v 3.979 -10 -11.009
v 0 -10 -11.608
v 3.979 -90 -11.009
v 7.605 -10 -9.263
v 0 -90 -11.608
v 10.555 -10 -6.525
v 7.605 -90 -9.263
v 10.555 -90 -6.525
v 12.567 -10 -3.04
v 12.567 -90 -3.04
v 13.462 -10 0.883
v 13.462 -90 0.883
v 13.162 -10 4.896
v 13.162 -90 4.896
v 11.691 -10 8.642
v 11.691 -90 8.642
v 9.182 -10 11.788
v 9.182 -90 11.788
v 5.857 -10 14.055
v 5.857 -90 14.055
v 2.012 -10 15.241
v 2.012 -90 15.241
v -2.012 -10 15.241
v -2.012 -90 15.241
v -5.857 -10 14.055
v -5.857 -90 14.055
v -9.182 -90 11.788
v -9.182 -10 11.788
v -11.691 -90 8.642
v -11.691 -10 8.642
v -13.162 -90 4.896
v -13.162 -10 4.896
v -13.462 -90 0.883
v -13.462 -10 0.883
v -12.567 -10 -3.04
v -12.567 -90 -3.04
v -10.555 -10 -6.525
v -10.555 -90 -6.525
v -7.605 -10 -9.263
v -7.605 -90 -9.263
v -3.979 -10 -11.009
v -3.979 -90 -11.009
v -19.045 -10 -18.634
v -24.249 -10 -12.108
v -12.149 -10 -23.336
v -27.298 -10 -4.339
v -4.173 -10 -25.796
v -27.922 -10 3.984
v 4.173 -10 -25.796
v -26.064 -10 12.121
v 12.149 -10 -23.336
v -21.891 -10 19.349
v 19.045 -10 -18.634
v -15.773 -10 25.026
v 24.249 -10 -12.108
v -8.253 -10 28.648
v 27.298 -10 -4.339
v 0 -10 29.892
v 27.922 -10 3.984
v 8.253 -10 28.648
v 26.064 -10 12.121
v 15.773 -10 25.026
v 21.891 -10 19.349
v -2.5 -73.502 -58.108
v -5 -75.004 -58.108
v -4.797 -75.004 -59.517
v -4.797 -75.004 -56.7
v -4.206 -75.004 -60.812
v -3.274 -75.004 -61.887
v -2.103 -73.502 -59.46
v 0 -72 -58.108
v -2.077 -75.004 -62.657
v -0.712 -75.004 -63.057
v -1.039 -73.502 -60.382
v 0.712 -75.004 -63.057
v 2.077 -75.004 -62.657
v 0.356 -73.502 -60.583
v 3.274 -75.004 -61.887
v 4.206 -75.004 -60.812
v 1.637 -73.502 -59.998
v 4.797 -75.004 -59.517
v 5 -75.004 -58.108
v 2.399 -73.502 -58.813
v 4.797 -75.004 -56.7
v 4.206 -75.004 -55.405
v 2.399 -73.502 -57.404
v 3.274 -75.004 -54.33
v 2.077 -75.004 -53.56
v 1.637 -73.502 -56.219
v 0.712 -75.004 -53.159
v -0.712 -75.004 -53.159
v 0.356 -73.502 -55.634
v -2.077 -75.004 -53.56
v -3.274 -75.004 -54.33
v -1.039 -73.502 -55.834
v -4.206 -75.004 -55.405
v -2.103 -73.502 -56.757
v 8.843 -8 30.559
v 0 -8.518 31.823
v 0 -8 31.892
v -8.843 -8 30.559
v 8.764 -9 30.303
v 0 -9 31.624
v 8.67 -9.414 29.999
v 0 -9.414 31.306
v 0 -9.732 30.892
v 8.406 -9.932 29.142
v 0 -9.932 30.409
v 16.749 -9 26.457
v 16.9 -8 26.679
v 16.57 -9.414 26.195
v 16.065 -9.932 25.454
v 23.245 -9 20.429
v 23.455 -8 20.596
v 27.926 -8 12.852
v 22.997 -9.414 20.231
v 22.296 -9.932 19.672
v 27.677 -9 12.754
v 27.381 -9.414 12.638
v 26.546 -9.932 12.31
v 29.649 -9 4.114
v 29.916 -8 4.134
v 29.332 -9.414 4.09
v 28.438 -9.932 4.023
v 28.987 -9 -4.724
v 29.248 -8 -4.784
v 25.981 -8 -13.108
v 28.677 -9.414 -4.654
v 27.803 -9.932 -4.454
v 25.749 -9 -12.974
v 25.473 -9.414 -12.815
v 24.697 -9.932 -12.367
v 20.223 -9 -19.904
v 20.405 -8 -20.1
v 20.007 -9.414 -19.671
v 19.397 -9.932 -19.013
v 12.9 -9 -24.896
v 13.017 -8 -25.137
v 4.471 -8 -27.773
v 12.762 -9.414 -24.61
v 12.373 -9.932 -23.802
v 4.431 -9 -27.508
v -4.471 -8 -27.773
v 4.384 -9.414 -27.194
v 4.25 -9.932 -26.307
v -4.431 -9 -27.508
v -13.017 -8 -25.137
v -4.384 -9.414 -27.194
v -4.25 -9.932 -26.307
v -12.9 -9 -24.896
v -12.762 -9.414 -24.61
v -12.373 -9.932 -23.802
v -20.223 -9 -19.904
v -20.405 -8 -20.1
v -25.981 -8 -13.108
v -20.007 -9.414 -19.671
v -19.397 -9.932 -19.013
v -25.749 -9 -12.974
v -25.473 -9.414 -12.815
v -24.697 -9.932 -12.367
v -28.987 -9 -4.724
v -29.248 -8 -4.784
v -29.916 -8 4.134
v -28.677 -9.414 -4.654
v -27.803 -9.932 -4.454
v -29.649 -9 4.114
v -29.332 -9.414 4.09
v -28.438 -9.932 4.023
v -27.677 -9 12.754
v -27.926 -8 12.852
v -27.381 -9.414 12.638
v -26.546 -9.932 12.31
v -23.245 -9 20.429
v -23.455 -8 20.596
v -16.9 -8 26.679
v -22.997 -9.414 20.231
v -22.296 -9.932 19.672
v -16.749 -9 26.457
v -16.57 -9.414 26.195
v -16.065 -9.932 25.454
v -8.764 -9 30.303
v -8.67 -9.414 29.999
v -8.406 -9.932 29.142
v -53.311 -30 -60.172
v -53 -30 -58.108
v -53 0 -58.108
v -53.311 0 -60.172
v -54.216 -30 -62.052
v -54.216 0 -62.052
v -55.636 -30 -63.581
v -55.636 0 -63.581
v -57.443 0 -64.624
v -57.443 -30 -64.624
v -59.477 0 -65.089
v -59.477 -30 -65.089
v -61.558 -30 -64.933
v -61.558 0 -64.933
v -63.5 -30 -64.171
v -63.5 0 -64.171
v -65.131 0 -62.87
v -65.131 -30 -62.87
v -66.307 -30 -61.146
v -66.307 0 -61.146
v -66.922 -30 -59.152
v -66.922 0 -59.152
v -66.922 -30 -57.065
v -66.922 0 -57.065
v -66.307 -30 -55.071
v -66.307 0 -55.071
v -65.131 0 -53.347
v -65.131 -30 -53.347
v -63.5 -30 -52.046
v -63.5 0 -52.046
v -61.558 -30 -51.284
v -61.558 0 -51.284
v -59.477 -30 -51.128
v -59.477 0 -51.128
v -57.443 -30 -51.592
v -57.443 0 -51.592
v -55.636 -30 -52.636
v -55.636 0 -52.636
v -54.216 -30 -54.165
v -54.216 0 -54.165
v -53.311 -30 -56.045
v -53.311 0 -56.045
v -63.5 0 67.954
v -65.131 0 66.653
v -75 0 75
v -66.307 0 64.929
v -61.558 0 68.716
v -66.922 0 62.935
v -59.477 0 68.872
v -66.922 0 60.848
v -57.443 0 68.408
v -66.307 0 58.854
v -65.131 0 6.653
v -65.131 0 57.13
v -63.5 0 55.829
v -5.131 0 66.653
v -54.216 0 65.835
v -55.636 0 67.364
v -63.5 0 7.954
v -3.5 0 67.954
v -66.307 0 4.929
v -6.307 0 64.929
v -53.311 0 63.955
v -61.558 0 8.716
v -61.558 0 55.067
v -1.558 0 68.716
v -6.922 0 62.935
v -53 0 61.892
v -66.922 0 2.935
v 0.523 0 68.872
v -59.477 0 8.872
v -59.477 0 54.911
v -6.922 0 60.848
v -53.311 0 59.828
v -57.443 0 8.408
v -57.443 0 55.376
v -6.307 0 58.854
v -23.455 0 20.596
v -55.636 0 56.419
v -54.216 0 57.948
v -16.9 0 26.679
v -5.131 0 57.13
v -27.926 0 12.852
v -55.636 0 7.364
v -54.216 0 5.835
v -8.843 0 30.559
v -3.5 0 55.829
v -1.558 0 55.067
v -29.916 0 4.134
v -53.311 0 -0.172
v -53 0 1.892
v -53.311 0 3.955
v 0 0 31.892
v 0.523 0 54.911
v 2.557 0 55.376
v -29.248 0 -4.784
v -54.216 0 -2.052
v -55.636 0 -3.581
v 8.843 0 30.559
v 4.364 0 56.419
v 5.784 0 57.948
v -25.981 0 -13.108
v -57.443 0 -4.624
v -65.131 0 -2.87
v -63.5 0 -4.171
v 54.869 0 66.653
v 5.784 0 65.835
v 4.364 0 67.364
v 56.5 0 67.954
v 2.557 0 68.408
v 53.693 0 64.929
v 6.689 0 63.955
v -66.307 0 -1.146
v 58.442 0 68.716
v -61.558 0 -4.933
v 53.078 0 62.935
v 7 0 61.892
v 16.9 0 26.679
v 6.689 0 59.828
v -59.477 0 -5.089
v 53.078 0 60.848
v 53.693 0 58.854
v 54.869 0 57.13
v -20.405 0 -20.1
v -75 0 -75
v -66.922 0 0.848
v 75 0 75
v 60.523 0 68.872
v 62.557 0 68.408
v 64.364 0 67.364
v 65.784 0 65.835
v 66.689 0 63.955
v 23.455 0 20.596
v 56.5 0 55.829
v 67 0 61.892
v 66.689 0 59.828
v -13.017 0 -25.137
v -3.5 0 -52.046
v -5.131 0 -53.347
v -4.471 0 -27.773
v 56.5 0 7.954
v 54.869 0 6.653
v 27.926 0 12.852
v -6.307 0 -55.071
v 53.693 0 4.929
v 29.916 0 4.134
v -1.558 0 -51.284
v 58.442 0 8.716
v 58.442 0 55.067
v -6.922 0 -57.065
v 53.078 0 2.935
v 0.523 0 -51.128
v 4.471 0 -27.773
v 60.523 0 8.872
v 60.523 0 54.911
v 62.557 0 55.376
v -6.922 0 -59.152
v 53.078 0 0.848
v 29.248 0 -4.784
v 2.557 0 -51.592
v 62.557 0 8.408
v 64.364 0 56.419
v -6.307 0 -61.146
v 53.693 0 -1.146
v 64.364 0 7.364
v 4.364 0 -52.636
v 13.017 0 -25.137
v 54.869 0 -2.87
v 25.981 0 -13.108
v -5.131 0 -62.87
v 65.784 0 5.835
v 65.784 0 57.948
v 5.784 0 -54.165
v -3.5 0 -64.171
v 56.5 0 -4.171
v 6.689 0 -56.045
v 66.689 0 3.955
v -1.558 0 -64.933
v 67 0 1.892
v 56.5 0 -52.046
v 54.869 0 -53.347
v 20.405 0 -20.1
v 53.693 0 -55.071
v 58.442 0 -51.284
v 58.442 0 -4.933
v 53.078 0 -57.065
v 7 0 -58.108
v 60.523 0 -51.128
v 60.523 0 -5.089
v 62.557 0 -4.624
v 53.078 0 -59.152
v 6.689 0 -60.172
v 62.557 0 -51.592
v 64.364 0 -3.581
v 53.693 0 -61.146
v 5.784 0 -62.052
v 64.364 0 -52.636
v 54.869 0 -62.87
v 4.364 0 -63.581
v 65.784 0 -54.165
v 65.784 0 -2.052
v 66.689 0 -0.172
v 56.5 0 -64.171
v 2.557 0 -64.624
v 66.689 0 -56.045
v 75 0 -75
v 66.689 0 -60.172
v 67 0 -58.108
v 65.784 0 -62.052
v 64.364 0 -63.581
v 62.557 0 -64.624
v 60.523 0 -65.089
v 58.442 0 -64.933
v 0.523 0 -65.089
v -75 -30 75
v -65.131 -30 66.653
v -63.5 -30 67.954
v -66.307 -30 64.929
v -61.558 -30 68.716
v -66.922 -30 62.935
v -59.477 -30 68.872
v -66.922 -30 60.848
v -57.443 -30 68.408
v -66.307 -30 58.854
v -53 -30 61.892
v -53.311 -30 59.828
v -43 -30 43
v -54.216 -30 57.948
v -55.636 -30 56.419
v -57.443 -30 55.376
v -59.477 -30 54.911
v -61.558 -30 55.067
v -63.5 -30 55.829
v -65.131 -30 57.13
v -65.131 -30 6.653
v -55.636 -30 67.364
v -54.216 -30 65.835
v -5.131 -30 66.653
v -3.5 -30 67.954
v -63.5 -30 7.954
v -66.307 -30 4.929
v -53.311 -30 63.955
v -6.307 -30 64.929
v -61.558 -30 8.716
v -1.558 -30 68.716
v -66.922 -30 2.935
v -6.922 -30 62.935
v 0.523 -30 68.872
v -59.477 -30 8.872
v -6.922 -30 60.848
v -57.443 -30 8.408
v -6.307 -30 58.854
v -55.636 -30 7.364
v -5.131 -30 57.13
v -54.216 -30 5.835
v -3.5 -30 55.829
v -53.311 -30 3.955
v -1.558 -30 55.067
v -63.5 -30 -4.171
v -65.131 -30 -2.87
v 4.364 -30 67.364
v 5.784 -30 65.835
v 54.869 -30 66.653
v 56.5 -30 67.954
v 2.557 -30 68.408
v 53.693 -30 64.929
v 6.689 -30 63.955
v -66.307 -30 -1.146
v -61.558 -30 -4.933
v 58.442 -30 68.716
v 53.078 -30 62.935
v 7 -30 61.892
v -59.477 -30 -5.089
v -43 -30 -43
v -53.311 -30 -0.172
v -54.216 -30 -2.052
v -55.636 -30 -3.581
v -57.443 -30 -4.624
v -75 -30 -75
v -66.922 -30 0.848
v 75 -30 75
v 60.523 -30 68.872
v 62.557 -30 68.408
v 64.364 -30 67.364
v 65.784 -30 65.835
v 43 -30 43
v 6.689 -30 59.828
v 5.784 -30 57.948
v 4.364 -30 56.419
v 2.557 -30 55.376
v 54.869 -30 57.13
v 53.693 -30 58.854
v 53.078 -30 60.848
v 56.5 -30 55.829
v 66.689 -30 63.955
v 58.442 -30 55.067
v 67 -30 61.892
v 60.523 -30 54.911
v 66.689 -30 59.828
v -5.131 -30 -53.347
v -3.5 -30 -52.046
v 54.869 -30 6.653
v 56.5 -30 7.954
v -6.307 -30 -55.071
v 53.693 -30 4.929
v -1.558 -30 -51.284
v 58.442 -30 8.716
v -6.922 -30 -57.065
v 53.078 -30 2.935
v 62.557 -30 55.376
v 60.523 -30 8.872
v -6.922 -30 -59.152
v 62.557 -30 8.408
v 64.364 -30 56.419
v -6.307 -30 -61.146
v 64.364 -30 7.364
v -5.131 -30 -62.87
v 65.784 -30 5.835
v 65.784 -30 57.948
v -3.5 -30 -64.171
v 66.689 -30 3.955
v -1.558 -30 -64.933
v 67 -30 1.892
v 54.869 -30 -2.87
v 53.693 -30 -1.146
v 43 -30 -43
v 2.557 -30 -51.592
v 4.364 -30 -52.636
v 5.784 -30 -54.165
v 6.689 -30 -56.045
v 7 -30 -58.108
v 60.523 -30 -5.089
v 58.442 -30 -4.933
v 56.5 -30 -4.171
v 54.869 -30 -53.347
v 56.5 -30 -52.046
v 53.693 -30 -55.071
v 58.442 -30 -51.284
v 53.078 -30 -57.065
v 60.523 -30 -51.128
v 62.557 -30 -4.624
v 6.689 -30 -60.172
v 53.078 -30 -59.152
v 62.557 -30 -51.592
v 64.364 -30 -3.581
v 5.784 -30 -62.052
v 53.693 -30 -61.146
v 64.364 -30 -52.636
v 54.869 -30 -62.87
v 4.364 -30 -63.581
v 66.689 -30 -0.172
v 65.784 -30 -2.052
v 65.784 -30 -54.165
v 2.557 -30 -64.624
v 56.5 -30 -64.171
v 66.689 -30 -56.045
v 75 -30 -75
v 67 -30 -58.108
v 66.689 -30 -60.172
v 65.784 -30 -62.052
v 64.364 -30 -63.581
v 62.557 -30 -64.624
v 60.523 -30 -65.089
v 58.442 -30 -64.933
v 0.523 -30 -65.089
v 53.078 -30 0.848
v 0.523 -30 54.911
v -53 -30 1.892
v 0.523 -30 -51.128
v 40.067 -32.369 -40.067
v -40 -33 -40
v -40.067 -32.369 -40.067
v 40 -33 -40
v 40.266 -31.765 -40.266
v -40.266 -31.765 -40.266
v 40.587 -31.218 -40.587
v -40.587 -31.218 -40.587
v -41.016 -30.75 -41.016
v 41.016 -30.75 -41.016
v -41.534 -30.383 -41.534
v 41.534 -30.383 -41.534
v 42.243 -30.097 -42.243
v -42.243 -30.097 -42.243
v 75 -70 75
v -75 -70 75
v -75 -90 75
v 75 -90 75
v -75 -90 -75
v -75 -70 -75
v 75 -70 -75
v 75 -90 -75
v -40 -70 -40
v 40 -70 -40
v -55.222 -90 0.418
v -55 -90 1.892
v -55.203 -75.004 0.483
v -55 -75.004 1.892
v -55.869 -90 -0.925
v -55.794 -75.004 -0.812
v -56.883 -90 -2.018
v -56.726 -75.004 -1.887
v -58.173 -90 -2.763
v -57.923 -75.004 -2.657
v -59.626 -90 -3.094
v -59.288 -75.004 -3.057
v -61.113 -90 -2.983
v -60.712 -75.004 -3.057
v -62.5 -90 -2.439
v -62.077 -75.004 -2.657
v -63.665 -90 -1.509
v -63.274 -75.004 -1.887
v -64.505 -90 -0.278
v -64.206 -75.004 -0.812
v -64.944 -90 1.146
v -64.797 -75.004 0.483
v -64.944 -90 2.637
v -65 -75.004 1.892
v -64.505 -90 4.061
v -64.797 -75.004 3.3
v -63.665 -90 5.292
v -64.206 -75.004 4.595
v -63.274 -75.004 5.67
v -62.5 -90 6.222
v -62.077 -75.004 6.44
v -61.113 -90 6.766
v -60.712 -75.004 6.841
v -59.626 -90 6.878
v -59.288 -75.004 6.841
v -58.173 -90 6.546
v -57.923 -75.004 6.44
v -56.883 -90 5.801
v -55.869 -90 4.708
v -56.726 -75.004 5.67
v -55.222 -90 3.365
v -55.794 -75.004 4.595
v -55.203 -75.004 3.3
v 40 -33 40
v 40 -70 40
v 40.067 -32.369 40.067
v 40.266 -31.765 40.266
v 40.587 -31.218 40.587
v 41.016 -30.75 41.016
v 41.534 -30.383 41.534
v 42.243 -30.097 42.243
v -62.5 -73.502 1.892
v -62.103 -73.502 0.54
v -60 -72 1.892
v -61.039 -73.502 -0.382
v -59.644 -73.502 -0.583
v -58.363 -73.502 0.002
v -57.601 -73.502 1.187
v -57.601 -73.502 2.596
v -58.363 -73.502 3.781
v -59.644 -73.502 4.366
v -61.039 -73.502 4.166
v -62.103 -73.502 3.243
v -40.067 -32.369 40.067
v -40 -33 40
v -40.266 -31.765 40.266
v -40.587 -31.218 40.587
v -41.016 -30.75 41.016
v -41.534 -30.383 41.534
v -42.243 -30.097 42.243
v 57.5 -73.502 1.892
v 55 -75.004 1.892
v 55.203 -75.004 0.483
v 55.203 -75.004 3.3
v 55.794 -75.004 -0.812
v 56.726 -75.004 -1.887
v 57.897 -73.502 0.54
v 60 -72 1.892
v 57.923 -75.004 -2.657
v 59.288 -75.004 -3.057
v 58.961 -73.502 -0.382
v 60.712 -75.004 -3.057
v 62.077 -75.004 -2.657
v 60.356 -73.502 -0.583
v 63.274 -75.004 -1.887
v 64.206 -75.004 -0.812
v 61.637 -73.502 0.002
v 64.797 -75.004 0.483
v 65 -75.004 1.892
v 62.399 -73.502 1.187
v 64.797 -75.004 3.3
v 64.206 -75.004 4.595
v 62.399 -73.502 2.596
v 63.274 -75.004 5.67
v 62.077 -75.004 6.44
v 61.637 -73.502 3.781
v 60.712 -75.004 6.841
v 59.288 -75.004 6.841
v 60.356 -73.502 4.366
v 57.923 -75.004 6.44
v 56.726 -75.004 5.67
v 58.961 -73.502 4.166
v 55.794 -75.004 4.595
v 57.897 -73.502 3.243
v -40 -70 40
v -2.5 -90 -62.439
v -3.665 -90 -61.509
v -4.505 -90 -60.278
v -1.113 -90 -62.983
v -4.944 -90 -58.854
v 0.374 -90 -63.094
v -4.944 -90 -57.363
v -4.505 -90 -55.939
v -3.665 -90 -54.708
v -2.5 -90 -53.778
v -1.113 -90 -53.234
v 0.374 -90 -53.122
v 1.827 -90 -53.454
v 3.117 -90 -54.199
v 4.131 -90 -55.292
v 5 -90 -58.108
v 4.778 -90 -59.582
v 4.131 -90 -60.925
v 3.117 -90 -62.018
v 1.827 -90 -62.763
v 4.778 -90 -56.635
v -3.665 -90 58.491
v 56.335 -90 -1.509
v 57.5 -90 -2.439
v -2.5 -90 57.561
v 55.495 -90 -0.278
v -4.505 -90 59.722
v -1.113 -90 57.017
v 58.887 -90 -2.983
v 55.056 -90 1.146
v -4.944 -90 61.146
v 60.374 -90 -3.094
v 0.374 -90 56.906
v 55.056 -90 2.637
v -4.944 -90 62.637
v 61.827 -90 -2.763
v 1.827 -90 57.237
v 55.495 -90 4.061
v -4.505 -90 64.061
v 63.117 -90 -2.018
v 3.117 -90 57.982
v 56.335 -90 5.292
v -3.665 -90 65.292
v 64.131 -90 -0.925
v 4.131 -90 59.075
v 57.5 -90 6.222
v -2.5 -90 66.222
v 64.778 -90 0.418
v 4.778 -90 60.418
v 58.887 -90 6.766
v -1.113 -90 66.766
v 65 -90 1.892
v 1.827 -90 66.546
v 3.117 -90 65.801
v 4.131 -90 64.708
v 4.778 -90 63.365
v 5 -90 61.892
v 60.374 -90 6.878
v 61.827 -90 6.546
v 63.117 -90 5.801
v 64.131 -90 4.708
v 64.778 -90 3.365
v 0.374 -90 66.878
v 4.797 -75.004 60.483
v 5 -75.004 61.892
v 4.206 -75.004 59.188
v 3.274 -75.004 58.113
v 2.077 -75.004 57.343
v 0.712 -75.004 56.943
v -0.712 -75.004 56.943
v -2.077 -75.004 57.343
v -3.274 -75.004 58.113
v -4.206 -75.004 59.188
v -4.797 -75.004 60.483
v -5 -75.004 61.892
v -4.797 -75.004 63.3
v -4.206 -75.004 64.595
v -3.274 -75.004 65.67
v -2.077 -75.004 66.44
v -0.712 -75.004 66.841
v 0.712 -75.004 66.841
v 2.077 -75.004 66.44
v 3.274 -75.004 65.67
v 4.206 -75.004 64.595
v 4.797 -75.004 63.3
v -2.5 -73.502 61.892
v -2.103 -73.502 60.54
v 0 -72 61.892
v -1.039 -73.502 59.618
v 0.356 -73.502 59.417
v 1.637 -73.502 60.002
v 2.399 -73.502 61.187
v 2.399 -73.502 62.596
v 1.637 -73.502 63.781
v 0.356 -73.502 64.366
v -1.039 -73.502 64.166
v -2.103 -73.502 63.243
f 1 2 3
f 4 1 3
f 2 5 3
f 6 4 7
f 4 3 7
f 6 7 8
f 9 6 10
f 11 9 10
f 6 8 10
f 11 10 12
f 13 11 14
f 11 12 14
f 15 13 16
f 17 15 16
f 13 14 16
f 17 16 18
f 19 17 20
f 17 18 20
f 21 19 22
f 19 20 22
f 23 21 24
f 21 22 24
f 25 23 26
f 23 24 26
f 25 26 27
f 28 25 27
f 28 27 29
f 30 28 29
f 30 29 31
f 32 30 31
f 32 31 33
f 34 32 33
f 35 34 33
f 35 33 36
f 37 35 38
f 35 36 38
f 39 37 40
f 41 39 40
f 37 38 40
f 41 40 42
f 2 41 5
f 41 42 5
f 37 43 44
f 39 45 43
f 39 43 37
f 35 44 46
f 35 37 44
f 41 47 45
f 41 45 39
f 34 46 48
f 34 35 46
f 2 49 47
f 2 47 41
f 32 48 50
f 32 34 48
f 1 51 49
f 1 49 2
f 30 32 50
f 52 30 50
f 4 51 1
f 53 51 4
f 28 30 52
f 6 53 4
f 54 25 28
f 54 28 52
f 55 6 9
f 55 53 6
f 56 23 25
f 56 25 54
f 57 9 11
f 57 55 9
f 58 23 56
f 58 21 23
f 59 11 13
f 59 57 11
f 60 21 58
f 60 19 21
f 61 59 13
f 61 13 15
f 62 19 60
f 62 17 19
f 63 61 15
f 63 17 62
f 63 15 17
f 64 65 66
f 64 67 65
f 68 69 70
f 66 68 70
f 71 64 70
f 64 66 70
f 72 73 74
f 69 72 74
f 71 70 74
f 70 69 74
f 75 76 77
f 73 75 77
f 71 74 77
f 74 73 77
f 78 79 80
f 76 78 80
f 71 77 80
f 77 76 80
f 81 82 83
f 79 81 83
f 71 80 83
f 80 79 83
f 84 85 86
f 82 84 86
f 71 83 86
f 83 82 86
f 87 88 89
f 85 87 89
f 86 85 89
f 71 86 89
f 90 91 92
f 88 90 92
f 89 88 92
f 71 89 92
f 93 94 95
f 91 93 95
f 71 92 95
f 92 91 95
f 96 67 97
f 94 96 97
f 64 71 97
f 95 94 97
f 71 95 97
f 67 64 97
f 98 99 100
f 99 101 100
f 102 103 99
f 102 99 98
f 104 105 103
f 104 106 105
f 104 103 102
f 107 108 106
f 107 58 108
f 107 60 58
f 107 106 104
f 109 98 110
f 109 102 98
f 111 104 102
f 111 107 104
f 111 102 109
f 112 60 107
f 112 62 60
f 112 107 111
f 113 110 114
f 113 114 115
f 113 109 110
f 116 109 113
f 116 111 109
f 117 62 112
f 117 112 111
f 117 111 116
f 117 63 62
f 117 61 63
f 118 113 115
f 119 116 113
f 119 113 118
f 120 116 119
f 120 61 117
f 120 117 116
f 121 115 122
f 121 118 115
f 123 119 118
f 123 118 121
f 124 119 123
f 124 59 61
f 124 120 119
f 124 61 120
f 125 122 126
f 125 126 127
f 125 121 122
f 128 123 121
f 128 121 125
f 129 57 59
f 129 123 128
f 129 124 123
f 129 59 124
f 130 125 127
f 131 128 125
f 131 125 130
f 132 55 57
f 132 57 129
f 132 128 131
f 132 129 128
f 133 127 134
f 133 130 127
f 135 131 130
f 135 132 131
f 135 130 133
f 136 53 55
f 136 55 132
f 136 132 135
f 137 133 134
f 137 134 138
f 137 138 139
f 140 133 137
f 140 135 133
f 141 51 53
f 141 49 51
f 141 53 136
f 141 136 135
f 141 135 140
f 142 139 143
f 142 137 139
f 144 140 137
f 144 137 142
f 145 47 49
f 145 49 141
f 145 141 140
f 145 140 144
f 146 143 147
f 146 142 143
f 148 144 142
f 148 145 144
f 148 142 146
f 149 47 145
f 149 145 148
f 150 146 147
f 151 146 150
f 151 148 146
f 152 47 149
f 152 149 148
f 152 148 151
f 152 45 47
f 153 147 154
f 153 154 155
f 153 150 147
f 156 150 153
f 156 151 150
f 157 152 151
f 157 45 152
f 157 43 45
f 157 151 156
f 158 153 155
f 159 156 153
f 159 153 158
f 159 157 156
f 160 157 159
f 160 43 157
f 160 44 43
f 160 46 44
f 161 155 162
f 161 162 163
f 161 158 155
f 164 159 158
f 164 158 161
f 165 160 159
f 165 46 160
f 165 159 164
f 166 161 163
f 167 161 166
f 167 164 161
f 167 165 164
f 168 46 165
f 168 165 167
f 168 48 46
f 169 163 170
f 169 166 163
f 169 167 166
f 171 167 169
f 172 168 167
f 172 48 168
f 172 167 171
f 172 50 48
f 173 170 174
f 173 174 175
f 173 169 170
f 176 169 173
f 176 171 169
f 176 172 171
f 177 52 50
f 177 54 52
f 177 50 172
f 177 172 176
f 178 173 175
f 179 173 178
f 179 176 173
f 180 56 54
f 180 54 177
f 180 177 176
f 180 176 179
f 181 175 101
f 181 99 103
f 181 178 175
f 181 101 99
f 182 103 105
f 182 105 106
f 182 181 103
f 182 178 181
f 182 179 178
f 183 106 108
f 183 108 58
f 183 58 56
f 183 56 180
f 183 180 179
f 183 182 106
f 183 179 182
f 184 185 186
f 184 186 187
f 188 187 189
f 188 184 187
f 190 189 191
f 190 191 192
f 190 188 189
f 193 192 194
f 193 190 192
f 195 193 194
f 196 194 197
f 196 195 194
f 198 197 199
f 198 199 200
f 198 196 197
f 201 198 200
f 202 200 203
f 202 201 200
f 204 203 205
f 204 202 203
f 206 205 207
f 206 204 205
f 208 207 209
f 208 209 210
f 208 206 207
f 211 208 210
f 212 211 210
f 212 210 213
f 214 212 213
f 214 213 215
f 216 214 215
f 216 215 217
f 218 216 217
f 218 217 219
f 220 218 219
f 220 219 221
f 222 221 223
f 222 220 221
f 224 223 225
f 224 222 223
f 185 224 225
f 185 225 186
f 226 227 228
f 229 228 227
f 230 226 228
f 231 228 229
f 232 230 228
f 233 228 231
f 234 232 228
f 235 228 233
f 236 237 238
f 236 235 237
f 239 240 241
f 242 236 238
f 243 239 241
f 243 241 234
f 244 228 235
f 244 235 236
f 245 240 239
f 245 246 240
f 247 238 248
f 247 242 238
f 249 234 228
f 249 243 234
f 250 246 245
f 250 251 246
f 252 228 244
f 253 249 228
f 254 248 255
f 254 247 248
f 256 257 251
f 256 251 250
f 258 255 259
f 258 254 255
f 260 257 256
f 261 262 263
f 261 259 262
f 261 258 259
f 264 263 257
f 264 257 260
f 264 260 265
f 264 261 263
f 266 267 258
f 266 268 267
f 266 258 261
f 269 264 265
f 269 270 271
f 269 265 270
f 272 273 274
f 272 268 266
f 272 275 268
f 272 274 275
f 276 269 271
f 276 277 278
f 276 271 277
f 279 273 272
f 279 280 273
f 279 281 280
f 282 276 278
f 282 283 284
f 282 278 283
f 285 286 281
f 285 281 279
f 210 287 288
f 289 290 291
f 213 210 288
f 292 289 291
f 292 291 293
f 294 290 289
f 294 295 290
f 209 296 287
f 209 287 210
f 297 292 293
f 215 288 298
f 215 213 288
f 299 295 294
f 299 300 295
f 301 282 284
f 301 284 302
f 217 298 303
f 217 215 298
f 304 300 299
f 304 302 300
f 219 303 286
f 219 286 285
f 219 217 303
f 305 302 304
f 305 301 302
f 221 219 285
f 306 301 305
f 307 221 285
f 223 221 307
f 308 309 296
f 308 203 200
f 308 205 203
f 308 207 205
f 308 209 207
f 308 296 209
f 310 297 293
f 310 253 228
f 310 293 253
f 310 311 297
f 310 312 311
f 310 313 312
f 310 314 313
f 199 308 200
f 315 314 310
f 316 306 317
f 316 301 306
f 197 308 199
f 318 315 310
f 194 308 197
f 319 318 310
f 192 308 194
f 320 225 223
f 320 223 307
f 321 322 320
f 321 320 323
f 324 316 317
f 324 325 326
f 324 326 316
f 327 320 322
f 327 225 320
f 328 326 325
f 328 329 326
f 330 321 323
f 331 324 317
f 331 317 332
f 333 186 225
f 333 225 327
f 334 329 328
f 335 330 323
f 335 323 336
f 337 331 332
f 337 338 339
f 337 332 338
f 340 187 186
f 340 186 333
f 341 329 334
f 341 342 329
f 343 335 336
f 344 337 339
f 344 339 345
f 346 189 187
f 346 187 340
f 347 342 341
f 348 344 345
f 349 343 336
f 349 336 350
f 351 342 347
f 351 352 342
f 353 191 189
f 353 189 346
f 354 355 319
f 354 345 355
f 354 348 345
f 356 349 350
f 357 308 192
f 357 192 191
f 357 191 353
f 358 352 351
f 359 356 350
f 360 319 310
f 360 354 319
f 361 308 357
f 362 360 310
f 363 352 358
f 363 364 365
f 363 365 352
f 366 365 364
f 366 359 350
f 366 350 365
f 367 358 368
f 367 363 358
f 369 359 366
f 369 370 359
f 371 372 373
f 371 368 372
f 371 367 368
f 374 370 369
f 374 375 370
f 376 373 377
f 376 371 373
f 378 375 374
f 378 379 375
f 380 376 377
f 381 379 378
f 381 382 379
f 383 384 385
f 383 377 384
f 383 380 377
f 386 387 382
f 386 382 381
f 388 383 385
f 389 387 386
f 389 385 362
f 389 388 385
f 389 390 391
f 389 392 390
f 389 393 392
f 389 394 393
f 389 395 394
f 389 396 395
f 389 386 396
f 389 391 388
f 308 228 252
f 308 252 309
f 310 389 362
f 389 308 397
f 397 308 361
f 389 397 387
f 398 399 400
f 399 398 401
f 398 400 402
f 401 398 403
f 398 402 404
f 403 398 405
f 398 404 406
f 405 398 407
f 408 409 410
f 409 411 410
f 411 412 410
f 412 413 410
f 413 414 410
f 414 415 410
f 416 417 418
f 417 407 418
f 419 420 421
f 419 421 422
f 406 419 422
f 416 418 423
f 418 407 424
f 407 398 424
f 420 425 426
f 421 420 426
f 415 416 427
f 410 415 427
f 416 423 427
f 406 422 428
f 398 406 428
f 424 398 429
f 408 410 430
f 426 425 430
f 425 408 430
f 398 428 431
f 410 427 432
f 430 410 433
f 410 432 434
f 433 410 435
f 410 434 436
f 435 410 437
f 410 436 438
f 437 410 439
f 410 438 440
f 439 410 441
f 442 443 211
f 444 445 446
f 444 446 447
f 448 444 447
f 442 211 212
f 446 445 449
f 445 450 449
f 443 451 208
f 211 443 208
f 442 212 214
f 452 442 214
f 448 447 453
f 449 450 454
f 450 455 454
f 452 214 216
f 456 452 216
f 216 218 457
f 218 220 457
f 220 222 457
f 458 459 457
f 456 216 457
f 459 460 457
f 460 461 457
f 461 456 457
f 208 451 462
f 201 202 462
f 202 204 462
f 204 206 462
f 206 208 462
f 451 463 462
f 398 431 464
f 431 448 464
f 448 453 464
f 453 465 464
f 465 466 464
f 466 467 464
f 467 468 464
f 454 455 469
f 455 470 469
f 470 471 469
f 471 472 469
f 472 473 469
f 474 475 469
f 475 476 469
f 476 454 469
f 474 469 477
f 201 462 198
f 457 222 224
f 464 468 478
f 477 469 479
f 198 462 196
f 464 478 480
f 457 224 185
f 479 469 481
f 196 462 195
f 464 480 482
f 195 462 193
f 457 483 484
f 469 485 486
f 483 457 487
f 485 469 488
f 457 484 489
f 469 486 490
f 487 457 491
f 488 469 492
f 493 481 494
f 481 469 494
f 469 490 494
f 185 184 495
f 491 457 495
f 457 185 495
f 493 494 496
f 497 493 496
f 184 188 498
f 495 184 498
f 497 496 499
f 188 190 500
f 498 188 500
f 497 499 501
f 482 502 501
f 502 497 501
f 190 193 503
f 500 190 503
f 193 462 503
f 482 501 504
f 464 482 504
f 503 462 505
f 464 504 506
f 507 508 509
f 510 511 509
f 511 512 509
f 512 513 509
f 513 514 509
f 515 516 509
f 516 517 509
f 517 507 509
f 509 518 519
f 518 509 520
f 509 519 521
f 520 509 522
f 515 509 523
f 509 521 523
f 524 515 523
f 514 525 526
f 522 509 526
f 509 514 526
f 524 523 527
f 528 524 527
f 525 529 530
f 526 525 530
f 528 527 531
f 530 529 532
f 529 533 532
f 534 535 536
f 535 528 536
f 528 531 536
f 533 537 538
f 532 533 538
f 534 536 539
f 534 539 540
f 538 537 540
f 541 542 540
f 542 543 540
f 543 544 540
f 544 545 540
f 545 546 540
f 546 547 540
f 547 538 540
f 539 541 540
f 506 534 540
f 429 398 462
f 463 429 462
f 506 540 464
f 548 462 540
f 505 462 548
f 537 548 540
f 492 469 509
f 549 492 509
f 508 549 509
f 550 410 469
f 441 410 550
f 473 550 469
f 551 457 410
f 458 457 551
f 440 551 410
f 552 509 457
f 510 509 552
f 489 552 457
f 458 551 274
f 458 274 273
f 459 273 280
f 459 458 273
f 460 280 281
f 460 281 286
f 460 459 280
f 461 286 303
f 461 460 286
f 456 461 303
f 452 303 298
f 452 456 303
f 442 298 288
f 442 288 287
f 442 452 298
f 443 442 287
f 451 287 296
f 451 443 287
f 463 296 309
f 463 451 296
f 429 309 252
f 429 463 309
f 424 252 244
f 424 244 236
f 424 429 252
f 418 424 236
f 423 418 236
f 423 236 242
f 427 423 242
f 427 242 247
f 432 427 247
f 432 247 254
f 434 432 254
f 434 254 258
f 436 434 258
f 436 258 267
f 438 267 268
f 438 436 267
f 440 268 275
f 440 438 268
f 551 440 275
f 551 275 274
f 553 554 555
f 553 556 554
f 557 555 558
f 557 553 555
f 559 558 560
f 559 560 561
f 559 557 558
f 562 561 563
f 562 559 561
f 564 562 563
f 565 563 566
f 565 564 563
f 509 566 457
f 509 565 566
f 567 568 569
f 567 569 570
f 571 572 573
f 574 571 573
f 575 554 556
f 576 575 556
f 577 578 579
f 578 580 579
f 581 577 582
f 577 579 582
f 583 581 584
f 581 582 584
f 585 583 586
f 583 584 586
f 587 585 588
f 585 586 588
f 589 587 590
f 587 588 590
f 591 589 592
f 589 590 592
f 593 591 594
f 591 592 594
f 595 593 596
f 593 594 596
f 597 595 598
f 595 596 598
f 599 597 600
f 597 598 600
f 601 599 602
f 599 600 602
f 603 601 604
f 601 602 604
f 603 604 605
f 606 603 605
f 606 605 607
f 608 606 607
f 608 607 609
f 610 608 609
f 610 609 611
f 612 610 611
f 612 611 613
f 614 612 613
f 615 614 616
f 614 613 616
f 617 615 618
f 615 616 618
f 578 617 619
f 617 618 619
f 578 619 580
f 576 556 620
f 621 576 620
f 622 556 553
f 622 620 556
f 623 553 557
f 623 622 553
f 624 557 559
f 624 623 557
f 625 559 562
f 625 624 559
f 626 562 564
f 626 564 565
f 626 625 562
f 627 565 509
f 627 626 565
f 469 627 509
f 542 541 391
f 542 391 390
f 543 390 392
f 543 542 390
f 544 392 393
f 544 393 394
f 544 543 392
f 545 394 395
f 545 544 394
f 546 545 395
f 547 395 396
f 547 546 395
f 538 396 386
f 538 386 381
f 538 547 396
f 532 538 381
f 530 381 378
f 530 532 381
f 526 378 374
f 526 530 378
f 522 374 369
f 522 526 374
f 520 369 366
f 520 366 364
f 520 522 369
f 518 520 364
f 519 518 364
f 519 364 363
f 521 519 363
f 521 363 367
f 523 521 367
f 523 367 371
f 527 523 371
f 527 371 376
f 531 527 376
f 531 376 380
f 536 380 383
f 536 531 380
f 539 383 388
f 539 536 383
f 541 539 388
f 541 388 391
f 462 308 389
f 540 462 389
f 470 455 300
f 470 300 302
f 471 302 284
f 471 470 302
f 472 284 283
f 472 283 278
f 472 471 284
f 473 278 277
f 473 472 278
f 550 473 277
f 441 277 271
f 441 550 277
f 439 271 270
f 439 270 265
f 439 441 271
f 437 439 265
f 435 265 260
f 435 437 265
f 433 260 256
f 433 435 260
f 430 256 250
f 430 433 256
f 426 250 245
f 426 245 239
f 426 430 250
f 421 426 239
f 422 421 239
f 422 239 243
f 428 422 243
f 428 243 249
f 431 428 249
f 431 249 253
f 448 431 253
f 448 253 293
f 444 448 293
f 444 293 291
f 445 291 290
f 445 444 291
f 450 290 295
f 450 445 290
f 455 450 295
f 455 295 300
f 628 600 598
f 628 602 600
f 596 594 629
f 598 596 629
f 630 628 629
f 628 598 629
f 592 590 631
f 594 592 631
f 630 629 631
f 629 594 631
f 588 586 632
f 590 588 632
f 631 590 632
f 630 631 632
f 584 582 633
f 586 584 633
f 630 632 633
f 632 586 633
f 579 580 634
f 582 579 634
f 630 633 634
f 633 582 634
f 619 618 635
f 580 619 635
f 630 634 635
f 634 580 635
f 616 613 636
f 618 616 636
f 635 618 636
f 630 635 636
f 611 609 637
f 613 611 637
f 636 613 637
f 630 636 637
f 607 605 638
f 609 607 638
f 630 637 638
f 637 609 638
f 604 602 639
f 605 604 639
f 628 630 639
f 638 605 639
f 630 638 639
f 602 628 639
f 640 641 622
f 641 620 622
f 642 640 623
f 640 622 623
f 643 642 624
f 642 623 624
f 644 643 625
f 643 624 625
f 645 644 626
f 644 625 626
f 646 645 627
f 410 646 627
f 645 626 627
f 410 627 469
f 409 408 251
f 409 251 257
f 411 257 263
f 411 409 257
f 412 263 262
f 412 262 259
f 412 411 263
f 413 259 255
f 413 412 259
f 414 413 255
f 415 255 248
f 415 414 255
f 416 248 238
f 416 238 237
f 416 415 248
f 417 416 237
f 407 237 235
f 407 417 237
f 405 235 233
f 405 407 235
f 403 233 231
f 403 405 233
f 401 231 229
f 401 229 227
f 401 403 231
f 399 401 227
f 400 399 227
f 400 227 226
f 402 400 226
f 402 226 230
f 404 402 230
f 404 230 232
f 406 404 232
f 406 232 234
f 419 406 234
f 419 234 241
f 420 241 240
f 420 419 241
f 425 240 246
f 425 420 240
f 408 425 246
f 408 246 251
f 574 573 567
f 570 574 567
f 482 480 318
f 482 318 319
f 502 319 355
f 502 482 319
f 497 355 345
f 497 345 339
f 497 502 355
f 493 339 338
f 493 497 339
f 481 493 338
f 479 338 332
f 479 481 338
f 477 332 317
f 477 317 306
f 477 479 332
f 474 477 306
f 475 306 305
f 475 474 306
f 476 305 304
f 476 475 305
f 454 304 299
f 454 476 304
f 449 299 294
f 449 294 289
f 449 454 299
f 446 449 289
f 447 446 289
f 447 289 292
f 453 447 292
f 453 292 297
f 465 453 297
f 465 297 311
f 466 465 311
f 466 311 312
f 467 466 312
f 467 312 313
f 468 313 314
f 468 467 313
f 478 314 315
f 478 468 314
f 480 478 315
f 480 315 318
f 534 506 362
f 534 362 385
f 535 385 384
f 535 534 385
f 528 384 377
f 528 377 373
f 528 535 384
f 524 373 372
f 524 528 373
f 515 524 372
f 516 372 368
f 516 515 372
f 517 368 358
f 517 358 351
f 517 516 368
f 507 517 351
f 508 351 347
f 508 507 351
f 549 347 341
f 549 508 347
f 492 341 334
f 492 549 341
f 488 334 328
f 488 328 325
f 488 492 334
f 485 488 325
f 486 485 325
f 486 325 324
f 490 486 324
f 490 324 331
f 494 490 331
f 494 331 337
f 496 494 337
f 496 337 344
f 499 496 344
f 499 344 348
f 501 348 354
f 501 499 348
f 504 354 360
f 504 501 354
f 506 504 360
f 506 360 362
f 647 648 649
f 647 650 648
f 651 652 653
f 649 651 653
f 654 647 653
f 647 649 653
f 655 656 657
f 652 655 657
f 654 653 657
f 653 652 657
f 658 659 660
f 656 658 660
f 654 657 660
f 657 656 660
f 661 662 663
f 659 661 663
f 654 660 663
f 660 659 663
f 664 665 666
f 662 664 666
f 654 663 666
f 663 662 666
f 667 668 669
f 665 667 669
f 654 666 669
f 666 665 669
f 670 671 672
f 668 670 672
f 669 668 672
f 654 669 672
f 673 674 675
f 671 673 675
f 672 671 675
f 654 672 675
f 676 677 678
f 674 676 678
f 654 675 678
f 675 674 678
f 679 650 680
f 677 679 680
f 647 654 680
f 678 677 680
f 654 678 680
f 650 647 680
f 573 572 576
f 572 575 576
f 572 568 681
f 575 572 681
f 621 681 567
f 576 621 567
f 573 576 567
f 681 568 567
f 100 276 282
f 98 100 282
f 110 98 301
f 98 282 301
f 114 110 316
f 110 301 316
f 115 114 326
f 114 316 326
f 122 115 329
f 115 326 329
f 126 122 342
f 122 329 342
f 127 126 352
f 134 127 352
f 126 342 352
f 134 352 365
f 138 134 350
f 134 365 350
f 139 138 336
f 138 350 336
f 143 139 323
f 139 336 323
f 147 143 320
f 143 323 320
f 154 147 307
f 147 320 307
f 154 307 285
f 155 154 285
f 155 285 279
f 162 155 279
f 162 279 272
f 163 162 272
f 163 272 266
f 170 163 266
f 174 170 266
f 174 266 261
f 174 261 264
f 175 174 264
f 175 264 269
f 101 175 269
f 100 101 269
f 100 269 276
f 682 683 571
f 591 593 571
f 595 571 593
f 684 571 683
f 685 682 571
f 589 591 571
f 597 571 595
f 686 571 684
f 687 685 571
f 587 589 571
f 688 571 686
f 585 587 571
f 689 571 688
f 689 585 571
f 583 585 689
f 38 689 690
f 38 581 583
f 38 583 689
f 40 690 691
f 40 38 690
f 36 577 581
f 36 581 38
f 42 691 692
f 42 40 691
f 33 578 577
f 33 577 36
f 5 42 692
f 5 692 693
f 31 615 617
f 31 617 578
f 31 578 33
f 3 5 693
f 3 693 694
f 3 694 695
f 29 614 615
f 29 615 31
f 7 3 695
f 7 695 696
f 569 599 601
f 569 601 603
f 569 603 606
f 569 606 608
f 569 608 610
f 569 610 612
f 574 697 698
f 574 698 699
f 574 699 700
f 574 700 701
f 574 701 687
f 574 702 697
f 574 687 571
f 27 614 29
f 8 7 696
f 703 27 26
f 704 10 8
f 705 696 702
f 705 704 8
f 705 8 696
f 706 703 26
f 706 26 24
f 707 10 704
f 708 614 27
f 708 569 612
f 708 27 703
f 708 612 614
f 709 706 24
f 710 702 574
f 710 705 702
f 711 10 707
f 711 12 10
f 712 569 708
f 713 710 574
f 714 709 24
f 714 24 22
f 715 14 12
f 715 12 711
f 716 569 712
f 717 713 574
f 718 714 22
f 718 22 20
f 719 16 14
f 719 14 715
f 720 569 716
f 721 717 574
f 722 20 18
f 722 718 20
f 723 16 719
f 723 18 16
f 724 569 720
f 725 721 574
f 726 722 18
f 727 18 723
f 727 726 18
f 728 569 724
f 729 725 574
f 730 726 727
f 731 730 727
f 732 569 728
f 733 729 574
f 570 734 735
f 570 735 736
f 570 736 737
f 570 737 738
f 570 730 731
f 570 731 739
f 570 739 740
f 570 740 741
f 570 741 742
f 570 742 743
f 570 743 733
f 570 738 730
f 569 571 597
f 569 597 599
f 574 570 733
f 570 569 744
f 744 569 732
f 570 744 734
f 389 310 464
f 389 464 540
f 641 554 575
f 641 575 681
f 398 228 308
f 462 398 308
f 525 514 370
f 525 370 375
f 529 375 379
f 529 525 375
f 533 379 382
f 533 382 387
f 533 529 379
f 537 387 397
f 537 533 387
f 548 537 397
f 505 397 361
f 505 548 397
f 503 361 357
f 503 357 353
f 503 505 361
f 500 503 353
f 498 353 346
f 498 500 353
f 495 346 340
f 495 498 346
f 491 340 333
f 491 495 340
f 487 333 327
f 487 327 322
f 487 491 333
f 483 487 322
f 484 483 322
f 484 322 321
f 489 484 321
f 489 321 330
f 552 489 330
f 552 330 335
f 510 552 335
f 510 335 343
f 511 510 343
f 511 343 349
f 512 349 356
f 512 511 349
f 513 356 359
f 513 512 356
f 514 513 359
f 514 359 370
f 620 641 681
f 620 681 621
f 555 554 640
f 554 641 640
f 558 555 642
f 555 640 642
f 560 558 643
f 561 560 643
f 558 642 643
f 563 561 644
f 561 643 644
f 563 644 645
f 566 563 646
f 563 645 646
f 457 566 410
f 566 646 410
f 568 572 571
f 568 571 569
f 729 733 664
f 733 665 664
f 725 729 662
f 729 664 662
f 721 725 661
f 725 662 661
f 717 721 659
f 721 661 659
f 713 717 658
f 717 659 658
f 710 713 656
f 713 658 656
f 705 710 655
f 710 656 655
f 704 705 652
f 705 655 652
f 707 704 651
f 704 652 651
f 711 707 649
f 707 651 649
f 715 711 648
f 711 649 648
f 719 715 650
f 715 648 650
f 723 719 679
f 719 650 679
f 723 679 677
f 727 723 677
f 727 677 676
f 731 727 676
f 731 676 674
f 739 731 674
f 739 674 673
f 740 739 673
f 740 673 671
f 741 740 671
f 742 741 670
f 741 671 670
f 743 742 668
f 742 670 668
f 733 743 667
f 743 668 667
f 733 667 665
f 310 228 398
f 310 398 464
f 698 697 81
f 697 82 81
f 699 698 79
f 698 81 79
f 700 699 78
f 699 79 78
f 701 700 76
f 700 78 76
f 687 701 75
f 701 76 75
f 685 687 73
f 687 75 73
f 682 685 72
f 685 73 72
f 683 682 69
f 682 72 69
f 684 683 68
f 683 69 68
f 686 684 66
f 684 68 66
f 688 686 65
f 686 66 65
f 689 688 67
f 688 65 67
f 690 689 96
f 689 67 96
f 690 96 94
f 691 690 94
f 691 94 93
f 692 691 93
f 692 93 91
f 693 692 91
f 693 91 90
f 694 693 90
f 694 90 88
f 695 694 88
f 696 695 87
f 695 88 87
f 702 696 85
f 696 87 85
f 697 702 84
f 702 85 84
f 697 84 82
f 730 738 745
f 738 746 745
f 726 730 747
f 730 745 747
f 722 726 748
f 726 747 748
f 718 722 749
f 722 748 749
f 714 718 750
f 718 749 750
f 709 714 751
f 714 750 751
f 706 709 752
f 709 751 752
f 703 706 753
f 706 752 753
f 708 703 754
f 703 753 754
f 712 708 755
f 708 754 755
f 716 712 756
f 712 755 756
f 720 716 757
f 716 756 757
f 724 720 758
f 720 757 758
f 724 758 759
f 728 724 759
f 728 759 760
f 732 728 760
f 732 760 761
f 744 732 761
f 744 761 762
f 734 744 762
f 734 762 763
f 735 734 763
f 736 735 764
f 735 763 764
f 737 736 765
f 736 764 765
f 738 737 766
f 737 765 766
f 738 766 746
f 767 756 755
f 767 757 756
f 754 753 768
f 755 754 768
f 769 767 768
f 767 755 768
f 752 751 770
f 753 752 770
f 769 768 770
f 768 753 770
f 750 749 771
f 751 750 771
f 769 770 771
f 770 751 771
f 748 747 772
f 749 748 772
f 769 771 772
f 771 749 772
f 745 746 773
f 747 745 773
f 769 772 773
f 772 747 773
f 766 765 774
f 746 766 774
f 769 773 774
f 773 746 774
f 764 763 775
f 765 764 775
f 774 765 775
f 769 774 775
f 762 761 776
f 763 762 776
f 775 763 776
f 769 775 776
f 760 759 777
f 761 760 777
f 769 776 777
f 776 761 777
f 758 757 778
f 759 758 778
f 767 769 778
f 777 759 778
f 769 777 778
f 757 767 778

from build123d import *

# Parameters (mm, degrees)
IZIM2_W                     = 150
IZIM2_H                     = 150
Y_KSEKLIK_EKSTR_ZYON1_DEPTH = 30
IZIM3_W                     = 80
IZIM3_H                     = 80
Y_KSEKLIK_EKSTR_ZYON2_DEPTH = 40
IZIM5_W                     = 150
IZIM5_H                     = 150
Y_KSEKLIK_EKSTR_ZYON3_DEPTH = 20
DELIK4_D                    = 27
DELIK4_CBORE_D              = 60
DELIK4_CBORE_DEPTH          = 10
M16_START                   = -30
M16_DI_LI_DELIK1_OUTLINE_R  = 7
M16_DI_LI_DELIK1_DEPTH      = 30
F_10_0_10_AP_DELIK1_D       = 10
F_10_0_10_AP_DELIK1_DEPTH   = 14.995696905
F_10_0_10_AP_DELIK1_TIP     = 3.004303095
RADYUS1_R                   = 3
RADYUS2_R                   = 2


# Read off the part's stored shape, not the designer's step: M16 Dişli Delik1
with BuildPart() as part:
    # Çizim2 → Yükseklik-Ekstrüzyon1 (new body)
    with BuildSketch(Plane(origin=(0, 0, 0), x_dir=(1, 0, 0), z_dir=(0, 1, 0))):
        Rectangle(IZIM2_W, IZIM2_H)
    extrude(amount=-Y_KSEKLIK_EKSTR_ZYON1_DEPTH)

    # Çizim3 → Yükseklik-Ekstrüzyon2 (add)
    with BuildSketch(Plane.XZ.offset(30)):
        Rectangle(IZIM3_W, IZIM3_H)
    extrude(amount=Y_KSEKLIK_EKSTR_ZYON2_DEPTH)

    # Çizim5 → Yükseklik-Ekstrüzyon3 (add)
    with BuildSketch(Plane.XZ.offset(70)):
        Rectangle(IZIM5_W, IZIM5_H)
    extrude(amount=Y_KSEKLIK_EKSTR_ZYON3_DEPTH)

    # Delik4 (through all)
    with Locations(Plane(origin=(0, 0, 1.891621306), x_dir=(0, 0, 1), z_dir=(0, 1, 0))):
        with Locations((0, 0)):
            CounterBoreHole(DELIK4_D / 2, DELIK4_CBORE_D / 2, DELIK4_CBORE_DEPTH)

    # M16 Dişli Delik1 outline → M16 Dişli Delik1 (cut)
    with BuildSketch(Plane(origin=(0, 0, 0), x_dir=(1, 0, 0), z_dir=(0, 1, 0)).offset(M16_START)):
        with Locations((0, -61.891621306)):
            Circle(M16_DI_LI_DELIK1_OUTLINE_R)
        with Locations((60, -1.891621306)):
            Circle(M16_DI_LI_DELIK1_OUTLINE_R)
        with Locations((-60, -1.891621306)):
            Circle(M16_DI_LI_DELIK1_OUTLINE_R)
        with Locations((0, 58.108378694)):
            Circle(M16_DI_LI_DELIK1_OUTLINE_R)
        with Locations((60, 58.108378694)):
            Circle(M16_DI_LI_DELIK1_OUTLINE_R)
        with Locations((-60, -61.891621306)):
            Circle(M16_DI_LI_DELIK1_OUTLINE_R)
        with Locations((-60, 58.108378694)):
            Circle(M16_DI_LI_DELIK1_OUTLINE_R)
        with Locations((60, -61.891621306)):
            Circle(M16_DI_LI_DELIK1_OUTLINE_R)
    extrude(amount=M16_DI_LI_DELIK1_DEPTH, mode=Mode.SUBTRACT)

    # Ø10.0 (10) Çap Delik1
    with Locations(Plane(origin=(0, -90, 0), x_dir=(-1, 0, 0), z_dir=(0, -1, 0))):
        with Locations((0, -1.891621306), (0, 58.108378694), (-60, -1.891621306), (60, -1.891621306), (0, -61.891621306)):
            Hole(F_10_0_10_AP_DELIK1_D / 2, depth=F_10_0_10_AP_DELIK1_DEPTH)
            with Locations((0, 0, -(F_10_0_10_AP_DELIK1_DEPTH + F_10_0_10_AP_DELIK1_TIP / 2))):  # 118° drill point
                Cone(0, F_10_0_10_AP_DELIK1_D / 2, F_10_0_10_AP_DELIK1_TIP, mode=Mode.SUBTRACT)

    # Radyus1
    radyus1_edges = [part.edges().sort_by_distance(p)[0] for p in [
        (40, -30, 0),
        (0, -30, 40),
        (-40, -30, 0),
        (0, -30, -40),
    ]]
    fillet(radyus1_edges, radius=RADYUS1_R)

    # Radyus2
    radyus2_edges = [part.edges().sort_by_distance(p)[0] for p in [
        (0, -10, -28.108378694),
    ]]
    fillet(radyus2_edges, radius=RADYUS2_R)


solid = part.part
